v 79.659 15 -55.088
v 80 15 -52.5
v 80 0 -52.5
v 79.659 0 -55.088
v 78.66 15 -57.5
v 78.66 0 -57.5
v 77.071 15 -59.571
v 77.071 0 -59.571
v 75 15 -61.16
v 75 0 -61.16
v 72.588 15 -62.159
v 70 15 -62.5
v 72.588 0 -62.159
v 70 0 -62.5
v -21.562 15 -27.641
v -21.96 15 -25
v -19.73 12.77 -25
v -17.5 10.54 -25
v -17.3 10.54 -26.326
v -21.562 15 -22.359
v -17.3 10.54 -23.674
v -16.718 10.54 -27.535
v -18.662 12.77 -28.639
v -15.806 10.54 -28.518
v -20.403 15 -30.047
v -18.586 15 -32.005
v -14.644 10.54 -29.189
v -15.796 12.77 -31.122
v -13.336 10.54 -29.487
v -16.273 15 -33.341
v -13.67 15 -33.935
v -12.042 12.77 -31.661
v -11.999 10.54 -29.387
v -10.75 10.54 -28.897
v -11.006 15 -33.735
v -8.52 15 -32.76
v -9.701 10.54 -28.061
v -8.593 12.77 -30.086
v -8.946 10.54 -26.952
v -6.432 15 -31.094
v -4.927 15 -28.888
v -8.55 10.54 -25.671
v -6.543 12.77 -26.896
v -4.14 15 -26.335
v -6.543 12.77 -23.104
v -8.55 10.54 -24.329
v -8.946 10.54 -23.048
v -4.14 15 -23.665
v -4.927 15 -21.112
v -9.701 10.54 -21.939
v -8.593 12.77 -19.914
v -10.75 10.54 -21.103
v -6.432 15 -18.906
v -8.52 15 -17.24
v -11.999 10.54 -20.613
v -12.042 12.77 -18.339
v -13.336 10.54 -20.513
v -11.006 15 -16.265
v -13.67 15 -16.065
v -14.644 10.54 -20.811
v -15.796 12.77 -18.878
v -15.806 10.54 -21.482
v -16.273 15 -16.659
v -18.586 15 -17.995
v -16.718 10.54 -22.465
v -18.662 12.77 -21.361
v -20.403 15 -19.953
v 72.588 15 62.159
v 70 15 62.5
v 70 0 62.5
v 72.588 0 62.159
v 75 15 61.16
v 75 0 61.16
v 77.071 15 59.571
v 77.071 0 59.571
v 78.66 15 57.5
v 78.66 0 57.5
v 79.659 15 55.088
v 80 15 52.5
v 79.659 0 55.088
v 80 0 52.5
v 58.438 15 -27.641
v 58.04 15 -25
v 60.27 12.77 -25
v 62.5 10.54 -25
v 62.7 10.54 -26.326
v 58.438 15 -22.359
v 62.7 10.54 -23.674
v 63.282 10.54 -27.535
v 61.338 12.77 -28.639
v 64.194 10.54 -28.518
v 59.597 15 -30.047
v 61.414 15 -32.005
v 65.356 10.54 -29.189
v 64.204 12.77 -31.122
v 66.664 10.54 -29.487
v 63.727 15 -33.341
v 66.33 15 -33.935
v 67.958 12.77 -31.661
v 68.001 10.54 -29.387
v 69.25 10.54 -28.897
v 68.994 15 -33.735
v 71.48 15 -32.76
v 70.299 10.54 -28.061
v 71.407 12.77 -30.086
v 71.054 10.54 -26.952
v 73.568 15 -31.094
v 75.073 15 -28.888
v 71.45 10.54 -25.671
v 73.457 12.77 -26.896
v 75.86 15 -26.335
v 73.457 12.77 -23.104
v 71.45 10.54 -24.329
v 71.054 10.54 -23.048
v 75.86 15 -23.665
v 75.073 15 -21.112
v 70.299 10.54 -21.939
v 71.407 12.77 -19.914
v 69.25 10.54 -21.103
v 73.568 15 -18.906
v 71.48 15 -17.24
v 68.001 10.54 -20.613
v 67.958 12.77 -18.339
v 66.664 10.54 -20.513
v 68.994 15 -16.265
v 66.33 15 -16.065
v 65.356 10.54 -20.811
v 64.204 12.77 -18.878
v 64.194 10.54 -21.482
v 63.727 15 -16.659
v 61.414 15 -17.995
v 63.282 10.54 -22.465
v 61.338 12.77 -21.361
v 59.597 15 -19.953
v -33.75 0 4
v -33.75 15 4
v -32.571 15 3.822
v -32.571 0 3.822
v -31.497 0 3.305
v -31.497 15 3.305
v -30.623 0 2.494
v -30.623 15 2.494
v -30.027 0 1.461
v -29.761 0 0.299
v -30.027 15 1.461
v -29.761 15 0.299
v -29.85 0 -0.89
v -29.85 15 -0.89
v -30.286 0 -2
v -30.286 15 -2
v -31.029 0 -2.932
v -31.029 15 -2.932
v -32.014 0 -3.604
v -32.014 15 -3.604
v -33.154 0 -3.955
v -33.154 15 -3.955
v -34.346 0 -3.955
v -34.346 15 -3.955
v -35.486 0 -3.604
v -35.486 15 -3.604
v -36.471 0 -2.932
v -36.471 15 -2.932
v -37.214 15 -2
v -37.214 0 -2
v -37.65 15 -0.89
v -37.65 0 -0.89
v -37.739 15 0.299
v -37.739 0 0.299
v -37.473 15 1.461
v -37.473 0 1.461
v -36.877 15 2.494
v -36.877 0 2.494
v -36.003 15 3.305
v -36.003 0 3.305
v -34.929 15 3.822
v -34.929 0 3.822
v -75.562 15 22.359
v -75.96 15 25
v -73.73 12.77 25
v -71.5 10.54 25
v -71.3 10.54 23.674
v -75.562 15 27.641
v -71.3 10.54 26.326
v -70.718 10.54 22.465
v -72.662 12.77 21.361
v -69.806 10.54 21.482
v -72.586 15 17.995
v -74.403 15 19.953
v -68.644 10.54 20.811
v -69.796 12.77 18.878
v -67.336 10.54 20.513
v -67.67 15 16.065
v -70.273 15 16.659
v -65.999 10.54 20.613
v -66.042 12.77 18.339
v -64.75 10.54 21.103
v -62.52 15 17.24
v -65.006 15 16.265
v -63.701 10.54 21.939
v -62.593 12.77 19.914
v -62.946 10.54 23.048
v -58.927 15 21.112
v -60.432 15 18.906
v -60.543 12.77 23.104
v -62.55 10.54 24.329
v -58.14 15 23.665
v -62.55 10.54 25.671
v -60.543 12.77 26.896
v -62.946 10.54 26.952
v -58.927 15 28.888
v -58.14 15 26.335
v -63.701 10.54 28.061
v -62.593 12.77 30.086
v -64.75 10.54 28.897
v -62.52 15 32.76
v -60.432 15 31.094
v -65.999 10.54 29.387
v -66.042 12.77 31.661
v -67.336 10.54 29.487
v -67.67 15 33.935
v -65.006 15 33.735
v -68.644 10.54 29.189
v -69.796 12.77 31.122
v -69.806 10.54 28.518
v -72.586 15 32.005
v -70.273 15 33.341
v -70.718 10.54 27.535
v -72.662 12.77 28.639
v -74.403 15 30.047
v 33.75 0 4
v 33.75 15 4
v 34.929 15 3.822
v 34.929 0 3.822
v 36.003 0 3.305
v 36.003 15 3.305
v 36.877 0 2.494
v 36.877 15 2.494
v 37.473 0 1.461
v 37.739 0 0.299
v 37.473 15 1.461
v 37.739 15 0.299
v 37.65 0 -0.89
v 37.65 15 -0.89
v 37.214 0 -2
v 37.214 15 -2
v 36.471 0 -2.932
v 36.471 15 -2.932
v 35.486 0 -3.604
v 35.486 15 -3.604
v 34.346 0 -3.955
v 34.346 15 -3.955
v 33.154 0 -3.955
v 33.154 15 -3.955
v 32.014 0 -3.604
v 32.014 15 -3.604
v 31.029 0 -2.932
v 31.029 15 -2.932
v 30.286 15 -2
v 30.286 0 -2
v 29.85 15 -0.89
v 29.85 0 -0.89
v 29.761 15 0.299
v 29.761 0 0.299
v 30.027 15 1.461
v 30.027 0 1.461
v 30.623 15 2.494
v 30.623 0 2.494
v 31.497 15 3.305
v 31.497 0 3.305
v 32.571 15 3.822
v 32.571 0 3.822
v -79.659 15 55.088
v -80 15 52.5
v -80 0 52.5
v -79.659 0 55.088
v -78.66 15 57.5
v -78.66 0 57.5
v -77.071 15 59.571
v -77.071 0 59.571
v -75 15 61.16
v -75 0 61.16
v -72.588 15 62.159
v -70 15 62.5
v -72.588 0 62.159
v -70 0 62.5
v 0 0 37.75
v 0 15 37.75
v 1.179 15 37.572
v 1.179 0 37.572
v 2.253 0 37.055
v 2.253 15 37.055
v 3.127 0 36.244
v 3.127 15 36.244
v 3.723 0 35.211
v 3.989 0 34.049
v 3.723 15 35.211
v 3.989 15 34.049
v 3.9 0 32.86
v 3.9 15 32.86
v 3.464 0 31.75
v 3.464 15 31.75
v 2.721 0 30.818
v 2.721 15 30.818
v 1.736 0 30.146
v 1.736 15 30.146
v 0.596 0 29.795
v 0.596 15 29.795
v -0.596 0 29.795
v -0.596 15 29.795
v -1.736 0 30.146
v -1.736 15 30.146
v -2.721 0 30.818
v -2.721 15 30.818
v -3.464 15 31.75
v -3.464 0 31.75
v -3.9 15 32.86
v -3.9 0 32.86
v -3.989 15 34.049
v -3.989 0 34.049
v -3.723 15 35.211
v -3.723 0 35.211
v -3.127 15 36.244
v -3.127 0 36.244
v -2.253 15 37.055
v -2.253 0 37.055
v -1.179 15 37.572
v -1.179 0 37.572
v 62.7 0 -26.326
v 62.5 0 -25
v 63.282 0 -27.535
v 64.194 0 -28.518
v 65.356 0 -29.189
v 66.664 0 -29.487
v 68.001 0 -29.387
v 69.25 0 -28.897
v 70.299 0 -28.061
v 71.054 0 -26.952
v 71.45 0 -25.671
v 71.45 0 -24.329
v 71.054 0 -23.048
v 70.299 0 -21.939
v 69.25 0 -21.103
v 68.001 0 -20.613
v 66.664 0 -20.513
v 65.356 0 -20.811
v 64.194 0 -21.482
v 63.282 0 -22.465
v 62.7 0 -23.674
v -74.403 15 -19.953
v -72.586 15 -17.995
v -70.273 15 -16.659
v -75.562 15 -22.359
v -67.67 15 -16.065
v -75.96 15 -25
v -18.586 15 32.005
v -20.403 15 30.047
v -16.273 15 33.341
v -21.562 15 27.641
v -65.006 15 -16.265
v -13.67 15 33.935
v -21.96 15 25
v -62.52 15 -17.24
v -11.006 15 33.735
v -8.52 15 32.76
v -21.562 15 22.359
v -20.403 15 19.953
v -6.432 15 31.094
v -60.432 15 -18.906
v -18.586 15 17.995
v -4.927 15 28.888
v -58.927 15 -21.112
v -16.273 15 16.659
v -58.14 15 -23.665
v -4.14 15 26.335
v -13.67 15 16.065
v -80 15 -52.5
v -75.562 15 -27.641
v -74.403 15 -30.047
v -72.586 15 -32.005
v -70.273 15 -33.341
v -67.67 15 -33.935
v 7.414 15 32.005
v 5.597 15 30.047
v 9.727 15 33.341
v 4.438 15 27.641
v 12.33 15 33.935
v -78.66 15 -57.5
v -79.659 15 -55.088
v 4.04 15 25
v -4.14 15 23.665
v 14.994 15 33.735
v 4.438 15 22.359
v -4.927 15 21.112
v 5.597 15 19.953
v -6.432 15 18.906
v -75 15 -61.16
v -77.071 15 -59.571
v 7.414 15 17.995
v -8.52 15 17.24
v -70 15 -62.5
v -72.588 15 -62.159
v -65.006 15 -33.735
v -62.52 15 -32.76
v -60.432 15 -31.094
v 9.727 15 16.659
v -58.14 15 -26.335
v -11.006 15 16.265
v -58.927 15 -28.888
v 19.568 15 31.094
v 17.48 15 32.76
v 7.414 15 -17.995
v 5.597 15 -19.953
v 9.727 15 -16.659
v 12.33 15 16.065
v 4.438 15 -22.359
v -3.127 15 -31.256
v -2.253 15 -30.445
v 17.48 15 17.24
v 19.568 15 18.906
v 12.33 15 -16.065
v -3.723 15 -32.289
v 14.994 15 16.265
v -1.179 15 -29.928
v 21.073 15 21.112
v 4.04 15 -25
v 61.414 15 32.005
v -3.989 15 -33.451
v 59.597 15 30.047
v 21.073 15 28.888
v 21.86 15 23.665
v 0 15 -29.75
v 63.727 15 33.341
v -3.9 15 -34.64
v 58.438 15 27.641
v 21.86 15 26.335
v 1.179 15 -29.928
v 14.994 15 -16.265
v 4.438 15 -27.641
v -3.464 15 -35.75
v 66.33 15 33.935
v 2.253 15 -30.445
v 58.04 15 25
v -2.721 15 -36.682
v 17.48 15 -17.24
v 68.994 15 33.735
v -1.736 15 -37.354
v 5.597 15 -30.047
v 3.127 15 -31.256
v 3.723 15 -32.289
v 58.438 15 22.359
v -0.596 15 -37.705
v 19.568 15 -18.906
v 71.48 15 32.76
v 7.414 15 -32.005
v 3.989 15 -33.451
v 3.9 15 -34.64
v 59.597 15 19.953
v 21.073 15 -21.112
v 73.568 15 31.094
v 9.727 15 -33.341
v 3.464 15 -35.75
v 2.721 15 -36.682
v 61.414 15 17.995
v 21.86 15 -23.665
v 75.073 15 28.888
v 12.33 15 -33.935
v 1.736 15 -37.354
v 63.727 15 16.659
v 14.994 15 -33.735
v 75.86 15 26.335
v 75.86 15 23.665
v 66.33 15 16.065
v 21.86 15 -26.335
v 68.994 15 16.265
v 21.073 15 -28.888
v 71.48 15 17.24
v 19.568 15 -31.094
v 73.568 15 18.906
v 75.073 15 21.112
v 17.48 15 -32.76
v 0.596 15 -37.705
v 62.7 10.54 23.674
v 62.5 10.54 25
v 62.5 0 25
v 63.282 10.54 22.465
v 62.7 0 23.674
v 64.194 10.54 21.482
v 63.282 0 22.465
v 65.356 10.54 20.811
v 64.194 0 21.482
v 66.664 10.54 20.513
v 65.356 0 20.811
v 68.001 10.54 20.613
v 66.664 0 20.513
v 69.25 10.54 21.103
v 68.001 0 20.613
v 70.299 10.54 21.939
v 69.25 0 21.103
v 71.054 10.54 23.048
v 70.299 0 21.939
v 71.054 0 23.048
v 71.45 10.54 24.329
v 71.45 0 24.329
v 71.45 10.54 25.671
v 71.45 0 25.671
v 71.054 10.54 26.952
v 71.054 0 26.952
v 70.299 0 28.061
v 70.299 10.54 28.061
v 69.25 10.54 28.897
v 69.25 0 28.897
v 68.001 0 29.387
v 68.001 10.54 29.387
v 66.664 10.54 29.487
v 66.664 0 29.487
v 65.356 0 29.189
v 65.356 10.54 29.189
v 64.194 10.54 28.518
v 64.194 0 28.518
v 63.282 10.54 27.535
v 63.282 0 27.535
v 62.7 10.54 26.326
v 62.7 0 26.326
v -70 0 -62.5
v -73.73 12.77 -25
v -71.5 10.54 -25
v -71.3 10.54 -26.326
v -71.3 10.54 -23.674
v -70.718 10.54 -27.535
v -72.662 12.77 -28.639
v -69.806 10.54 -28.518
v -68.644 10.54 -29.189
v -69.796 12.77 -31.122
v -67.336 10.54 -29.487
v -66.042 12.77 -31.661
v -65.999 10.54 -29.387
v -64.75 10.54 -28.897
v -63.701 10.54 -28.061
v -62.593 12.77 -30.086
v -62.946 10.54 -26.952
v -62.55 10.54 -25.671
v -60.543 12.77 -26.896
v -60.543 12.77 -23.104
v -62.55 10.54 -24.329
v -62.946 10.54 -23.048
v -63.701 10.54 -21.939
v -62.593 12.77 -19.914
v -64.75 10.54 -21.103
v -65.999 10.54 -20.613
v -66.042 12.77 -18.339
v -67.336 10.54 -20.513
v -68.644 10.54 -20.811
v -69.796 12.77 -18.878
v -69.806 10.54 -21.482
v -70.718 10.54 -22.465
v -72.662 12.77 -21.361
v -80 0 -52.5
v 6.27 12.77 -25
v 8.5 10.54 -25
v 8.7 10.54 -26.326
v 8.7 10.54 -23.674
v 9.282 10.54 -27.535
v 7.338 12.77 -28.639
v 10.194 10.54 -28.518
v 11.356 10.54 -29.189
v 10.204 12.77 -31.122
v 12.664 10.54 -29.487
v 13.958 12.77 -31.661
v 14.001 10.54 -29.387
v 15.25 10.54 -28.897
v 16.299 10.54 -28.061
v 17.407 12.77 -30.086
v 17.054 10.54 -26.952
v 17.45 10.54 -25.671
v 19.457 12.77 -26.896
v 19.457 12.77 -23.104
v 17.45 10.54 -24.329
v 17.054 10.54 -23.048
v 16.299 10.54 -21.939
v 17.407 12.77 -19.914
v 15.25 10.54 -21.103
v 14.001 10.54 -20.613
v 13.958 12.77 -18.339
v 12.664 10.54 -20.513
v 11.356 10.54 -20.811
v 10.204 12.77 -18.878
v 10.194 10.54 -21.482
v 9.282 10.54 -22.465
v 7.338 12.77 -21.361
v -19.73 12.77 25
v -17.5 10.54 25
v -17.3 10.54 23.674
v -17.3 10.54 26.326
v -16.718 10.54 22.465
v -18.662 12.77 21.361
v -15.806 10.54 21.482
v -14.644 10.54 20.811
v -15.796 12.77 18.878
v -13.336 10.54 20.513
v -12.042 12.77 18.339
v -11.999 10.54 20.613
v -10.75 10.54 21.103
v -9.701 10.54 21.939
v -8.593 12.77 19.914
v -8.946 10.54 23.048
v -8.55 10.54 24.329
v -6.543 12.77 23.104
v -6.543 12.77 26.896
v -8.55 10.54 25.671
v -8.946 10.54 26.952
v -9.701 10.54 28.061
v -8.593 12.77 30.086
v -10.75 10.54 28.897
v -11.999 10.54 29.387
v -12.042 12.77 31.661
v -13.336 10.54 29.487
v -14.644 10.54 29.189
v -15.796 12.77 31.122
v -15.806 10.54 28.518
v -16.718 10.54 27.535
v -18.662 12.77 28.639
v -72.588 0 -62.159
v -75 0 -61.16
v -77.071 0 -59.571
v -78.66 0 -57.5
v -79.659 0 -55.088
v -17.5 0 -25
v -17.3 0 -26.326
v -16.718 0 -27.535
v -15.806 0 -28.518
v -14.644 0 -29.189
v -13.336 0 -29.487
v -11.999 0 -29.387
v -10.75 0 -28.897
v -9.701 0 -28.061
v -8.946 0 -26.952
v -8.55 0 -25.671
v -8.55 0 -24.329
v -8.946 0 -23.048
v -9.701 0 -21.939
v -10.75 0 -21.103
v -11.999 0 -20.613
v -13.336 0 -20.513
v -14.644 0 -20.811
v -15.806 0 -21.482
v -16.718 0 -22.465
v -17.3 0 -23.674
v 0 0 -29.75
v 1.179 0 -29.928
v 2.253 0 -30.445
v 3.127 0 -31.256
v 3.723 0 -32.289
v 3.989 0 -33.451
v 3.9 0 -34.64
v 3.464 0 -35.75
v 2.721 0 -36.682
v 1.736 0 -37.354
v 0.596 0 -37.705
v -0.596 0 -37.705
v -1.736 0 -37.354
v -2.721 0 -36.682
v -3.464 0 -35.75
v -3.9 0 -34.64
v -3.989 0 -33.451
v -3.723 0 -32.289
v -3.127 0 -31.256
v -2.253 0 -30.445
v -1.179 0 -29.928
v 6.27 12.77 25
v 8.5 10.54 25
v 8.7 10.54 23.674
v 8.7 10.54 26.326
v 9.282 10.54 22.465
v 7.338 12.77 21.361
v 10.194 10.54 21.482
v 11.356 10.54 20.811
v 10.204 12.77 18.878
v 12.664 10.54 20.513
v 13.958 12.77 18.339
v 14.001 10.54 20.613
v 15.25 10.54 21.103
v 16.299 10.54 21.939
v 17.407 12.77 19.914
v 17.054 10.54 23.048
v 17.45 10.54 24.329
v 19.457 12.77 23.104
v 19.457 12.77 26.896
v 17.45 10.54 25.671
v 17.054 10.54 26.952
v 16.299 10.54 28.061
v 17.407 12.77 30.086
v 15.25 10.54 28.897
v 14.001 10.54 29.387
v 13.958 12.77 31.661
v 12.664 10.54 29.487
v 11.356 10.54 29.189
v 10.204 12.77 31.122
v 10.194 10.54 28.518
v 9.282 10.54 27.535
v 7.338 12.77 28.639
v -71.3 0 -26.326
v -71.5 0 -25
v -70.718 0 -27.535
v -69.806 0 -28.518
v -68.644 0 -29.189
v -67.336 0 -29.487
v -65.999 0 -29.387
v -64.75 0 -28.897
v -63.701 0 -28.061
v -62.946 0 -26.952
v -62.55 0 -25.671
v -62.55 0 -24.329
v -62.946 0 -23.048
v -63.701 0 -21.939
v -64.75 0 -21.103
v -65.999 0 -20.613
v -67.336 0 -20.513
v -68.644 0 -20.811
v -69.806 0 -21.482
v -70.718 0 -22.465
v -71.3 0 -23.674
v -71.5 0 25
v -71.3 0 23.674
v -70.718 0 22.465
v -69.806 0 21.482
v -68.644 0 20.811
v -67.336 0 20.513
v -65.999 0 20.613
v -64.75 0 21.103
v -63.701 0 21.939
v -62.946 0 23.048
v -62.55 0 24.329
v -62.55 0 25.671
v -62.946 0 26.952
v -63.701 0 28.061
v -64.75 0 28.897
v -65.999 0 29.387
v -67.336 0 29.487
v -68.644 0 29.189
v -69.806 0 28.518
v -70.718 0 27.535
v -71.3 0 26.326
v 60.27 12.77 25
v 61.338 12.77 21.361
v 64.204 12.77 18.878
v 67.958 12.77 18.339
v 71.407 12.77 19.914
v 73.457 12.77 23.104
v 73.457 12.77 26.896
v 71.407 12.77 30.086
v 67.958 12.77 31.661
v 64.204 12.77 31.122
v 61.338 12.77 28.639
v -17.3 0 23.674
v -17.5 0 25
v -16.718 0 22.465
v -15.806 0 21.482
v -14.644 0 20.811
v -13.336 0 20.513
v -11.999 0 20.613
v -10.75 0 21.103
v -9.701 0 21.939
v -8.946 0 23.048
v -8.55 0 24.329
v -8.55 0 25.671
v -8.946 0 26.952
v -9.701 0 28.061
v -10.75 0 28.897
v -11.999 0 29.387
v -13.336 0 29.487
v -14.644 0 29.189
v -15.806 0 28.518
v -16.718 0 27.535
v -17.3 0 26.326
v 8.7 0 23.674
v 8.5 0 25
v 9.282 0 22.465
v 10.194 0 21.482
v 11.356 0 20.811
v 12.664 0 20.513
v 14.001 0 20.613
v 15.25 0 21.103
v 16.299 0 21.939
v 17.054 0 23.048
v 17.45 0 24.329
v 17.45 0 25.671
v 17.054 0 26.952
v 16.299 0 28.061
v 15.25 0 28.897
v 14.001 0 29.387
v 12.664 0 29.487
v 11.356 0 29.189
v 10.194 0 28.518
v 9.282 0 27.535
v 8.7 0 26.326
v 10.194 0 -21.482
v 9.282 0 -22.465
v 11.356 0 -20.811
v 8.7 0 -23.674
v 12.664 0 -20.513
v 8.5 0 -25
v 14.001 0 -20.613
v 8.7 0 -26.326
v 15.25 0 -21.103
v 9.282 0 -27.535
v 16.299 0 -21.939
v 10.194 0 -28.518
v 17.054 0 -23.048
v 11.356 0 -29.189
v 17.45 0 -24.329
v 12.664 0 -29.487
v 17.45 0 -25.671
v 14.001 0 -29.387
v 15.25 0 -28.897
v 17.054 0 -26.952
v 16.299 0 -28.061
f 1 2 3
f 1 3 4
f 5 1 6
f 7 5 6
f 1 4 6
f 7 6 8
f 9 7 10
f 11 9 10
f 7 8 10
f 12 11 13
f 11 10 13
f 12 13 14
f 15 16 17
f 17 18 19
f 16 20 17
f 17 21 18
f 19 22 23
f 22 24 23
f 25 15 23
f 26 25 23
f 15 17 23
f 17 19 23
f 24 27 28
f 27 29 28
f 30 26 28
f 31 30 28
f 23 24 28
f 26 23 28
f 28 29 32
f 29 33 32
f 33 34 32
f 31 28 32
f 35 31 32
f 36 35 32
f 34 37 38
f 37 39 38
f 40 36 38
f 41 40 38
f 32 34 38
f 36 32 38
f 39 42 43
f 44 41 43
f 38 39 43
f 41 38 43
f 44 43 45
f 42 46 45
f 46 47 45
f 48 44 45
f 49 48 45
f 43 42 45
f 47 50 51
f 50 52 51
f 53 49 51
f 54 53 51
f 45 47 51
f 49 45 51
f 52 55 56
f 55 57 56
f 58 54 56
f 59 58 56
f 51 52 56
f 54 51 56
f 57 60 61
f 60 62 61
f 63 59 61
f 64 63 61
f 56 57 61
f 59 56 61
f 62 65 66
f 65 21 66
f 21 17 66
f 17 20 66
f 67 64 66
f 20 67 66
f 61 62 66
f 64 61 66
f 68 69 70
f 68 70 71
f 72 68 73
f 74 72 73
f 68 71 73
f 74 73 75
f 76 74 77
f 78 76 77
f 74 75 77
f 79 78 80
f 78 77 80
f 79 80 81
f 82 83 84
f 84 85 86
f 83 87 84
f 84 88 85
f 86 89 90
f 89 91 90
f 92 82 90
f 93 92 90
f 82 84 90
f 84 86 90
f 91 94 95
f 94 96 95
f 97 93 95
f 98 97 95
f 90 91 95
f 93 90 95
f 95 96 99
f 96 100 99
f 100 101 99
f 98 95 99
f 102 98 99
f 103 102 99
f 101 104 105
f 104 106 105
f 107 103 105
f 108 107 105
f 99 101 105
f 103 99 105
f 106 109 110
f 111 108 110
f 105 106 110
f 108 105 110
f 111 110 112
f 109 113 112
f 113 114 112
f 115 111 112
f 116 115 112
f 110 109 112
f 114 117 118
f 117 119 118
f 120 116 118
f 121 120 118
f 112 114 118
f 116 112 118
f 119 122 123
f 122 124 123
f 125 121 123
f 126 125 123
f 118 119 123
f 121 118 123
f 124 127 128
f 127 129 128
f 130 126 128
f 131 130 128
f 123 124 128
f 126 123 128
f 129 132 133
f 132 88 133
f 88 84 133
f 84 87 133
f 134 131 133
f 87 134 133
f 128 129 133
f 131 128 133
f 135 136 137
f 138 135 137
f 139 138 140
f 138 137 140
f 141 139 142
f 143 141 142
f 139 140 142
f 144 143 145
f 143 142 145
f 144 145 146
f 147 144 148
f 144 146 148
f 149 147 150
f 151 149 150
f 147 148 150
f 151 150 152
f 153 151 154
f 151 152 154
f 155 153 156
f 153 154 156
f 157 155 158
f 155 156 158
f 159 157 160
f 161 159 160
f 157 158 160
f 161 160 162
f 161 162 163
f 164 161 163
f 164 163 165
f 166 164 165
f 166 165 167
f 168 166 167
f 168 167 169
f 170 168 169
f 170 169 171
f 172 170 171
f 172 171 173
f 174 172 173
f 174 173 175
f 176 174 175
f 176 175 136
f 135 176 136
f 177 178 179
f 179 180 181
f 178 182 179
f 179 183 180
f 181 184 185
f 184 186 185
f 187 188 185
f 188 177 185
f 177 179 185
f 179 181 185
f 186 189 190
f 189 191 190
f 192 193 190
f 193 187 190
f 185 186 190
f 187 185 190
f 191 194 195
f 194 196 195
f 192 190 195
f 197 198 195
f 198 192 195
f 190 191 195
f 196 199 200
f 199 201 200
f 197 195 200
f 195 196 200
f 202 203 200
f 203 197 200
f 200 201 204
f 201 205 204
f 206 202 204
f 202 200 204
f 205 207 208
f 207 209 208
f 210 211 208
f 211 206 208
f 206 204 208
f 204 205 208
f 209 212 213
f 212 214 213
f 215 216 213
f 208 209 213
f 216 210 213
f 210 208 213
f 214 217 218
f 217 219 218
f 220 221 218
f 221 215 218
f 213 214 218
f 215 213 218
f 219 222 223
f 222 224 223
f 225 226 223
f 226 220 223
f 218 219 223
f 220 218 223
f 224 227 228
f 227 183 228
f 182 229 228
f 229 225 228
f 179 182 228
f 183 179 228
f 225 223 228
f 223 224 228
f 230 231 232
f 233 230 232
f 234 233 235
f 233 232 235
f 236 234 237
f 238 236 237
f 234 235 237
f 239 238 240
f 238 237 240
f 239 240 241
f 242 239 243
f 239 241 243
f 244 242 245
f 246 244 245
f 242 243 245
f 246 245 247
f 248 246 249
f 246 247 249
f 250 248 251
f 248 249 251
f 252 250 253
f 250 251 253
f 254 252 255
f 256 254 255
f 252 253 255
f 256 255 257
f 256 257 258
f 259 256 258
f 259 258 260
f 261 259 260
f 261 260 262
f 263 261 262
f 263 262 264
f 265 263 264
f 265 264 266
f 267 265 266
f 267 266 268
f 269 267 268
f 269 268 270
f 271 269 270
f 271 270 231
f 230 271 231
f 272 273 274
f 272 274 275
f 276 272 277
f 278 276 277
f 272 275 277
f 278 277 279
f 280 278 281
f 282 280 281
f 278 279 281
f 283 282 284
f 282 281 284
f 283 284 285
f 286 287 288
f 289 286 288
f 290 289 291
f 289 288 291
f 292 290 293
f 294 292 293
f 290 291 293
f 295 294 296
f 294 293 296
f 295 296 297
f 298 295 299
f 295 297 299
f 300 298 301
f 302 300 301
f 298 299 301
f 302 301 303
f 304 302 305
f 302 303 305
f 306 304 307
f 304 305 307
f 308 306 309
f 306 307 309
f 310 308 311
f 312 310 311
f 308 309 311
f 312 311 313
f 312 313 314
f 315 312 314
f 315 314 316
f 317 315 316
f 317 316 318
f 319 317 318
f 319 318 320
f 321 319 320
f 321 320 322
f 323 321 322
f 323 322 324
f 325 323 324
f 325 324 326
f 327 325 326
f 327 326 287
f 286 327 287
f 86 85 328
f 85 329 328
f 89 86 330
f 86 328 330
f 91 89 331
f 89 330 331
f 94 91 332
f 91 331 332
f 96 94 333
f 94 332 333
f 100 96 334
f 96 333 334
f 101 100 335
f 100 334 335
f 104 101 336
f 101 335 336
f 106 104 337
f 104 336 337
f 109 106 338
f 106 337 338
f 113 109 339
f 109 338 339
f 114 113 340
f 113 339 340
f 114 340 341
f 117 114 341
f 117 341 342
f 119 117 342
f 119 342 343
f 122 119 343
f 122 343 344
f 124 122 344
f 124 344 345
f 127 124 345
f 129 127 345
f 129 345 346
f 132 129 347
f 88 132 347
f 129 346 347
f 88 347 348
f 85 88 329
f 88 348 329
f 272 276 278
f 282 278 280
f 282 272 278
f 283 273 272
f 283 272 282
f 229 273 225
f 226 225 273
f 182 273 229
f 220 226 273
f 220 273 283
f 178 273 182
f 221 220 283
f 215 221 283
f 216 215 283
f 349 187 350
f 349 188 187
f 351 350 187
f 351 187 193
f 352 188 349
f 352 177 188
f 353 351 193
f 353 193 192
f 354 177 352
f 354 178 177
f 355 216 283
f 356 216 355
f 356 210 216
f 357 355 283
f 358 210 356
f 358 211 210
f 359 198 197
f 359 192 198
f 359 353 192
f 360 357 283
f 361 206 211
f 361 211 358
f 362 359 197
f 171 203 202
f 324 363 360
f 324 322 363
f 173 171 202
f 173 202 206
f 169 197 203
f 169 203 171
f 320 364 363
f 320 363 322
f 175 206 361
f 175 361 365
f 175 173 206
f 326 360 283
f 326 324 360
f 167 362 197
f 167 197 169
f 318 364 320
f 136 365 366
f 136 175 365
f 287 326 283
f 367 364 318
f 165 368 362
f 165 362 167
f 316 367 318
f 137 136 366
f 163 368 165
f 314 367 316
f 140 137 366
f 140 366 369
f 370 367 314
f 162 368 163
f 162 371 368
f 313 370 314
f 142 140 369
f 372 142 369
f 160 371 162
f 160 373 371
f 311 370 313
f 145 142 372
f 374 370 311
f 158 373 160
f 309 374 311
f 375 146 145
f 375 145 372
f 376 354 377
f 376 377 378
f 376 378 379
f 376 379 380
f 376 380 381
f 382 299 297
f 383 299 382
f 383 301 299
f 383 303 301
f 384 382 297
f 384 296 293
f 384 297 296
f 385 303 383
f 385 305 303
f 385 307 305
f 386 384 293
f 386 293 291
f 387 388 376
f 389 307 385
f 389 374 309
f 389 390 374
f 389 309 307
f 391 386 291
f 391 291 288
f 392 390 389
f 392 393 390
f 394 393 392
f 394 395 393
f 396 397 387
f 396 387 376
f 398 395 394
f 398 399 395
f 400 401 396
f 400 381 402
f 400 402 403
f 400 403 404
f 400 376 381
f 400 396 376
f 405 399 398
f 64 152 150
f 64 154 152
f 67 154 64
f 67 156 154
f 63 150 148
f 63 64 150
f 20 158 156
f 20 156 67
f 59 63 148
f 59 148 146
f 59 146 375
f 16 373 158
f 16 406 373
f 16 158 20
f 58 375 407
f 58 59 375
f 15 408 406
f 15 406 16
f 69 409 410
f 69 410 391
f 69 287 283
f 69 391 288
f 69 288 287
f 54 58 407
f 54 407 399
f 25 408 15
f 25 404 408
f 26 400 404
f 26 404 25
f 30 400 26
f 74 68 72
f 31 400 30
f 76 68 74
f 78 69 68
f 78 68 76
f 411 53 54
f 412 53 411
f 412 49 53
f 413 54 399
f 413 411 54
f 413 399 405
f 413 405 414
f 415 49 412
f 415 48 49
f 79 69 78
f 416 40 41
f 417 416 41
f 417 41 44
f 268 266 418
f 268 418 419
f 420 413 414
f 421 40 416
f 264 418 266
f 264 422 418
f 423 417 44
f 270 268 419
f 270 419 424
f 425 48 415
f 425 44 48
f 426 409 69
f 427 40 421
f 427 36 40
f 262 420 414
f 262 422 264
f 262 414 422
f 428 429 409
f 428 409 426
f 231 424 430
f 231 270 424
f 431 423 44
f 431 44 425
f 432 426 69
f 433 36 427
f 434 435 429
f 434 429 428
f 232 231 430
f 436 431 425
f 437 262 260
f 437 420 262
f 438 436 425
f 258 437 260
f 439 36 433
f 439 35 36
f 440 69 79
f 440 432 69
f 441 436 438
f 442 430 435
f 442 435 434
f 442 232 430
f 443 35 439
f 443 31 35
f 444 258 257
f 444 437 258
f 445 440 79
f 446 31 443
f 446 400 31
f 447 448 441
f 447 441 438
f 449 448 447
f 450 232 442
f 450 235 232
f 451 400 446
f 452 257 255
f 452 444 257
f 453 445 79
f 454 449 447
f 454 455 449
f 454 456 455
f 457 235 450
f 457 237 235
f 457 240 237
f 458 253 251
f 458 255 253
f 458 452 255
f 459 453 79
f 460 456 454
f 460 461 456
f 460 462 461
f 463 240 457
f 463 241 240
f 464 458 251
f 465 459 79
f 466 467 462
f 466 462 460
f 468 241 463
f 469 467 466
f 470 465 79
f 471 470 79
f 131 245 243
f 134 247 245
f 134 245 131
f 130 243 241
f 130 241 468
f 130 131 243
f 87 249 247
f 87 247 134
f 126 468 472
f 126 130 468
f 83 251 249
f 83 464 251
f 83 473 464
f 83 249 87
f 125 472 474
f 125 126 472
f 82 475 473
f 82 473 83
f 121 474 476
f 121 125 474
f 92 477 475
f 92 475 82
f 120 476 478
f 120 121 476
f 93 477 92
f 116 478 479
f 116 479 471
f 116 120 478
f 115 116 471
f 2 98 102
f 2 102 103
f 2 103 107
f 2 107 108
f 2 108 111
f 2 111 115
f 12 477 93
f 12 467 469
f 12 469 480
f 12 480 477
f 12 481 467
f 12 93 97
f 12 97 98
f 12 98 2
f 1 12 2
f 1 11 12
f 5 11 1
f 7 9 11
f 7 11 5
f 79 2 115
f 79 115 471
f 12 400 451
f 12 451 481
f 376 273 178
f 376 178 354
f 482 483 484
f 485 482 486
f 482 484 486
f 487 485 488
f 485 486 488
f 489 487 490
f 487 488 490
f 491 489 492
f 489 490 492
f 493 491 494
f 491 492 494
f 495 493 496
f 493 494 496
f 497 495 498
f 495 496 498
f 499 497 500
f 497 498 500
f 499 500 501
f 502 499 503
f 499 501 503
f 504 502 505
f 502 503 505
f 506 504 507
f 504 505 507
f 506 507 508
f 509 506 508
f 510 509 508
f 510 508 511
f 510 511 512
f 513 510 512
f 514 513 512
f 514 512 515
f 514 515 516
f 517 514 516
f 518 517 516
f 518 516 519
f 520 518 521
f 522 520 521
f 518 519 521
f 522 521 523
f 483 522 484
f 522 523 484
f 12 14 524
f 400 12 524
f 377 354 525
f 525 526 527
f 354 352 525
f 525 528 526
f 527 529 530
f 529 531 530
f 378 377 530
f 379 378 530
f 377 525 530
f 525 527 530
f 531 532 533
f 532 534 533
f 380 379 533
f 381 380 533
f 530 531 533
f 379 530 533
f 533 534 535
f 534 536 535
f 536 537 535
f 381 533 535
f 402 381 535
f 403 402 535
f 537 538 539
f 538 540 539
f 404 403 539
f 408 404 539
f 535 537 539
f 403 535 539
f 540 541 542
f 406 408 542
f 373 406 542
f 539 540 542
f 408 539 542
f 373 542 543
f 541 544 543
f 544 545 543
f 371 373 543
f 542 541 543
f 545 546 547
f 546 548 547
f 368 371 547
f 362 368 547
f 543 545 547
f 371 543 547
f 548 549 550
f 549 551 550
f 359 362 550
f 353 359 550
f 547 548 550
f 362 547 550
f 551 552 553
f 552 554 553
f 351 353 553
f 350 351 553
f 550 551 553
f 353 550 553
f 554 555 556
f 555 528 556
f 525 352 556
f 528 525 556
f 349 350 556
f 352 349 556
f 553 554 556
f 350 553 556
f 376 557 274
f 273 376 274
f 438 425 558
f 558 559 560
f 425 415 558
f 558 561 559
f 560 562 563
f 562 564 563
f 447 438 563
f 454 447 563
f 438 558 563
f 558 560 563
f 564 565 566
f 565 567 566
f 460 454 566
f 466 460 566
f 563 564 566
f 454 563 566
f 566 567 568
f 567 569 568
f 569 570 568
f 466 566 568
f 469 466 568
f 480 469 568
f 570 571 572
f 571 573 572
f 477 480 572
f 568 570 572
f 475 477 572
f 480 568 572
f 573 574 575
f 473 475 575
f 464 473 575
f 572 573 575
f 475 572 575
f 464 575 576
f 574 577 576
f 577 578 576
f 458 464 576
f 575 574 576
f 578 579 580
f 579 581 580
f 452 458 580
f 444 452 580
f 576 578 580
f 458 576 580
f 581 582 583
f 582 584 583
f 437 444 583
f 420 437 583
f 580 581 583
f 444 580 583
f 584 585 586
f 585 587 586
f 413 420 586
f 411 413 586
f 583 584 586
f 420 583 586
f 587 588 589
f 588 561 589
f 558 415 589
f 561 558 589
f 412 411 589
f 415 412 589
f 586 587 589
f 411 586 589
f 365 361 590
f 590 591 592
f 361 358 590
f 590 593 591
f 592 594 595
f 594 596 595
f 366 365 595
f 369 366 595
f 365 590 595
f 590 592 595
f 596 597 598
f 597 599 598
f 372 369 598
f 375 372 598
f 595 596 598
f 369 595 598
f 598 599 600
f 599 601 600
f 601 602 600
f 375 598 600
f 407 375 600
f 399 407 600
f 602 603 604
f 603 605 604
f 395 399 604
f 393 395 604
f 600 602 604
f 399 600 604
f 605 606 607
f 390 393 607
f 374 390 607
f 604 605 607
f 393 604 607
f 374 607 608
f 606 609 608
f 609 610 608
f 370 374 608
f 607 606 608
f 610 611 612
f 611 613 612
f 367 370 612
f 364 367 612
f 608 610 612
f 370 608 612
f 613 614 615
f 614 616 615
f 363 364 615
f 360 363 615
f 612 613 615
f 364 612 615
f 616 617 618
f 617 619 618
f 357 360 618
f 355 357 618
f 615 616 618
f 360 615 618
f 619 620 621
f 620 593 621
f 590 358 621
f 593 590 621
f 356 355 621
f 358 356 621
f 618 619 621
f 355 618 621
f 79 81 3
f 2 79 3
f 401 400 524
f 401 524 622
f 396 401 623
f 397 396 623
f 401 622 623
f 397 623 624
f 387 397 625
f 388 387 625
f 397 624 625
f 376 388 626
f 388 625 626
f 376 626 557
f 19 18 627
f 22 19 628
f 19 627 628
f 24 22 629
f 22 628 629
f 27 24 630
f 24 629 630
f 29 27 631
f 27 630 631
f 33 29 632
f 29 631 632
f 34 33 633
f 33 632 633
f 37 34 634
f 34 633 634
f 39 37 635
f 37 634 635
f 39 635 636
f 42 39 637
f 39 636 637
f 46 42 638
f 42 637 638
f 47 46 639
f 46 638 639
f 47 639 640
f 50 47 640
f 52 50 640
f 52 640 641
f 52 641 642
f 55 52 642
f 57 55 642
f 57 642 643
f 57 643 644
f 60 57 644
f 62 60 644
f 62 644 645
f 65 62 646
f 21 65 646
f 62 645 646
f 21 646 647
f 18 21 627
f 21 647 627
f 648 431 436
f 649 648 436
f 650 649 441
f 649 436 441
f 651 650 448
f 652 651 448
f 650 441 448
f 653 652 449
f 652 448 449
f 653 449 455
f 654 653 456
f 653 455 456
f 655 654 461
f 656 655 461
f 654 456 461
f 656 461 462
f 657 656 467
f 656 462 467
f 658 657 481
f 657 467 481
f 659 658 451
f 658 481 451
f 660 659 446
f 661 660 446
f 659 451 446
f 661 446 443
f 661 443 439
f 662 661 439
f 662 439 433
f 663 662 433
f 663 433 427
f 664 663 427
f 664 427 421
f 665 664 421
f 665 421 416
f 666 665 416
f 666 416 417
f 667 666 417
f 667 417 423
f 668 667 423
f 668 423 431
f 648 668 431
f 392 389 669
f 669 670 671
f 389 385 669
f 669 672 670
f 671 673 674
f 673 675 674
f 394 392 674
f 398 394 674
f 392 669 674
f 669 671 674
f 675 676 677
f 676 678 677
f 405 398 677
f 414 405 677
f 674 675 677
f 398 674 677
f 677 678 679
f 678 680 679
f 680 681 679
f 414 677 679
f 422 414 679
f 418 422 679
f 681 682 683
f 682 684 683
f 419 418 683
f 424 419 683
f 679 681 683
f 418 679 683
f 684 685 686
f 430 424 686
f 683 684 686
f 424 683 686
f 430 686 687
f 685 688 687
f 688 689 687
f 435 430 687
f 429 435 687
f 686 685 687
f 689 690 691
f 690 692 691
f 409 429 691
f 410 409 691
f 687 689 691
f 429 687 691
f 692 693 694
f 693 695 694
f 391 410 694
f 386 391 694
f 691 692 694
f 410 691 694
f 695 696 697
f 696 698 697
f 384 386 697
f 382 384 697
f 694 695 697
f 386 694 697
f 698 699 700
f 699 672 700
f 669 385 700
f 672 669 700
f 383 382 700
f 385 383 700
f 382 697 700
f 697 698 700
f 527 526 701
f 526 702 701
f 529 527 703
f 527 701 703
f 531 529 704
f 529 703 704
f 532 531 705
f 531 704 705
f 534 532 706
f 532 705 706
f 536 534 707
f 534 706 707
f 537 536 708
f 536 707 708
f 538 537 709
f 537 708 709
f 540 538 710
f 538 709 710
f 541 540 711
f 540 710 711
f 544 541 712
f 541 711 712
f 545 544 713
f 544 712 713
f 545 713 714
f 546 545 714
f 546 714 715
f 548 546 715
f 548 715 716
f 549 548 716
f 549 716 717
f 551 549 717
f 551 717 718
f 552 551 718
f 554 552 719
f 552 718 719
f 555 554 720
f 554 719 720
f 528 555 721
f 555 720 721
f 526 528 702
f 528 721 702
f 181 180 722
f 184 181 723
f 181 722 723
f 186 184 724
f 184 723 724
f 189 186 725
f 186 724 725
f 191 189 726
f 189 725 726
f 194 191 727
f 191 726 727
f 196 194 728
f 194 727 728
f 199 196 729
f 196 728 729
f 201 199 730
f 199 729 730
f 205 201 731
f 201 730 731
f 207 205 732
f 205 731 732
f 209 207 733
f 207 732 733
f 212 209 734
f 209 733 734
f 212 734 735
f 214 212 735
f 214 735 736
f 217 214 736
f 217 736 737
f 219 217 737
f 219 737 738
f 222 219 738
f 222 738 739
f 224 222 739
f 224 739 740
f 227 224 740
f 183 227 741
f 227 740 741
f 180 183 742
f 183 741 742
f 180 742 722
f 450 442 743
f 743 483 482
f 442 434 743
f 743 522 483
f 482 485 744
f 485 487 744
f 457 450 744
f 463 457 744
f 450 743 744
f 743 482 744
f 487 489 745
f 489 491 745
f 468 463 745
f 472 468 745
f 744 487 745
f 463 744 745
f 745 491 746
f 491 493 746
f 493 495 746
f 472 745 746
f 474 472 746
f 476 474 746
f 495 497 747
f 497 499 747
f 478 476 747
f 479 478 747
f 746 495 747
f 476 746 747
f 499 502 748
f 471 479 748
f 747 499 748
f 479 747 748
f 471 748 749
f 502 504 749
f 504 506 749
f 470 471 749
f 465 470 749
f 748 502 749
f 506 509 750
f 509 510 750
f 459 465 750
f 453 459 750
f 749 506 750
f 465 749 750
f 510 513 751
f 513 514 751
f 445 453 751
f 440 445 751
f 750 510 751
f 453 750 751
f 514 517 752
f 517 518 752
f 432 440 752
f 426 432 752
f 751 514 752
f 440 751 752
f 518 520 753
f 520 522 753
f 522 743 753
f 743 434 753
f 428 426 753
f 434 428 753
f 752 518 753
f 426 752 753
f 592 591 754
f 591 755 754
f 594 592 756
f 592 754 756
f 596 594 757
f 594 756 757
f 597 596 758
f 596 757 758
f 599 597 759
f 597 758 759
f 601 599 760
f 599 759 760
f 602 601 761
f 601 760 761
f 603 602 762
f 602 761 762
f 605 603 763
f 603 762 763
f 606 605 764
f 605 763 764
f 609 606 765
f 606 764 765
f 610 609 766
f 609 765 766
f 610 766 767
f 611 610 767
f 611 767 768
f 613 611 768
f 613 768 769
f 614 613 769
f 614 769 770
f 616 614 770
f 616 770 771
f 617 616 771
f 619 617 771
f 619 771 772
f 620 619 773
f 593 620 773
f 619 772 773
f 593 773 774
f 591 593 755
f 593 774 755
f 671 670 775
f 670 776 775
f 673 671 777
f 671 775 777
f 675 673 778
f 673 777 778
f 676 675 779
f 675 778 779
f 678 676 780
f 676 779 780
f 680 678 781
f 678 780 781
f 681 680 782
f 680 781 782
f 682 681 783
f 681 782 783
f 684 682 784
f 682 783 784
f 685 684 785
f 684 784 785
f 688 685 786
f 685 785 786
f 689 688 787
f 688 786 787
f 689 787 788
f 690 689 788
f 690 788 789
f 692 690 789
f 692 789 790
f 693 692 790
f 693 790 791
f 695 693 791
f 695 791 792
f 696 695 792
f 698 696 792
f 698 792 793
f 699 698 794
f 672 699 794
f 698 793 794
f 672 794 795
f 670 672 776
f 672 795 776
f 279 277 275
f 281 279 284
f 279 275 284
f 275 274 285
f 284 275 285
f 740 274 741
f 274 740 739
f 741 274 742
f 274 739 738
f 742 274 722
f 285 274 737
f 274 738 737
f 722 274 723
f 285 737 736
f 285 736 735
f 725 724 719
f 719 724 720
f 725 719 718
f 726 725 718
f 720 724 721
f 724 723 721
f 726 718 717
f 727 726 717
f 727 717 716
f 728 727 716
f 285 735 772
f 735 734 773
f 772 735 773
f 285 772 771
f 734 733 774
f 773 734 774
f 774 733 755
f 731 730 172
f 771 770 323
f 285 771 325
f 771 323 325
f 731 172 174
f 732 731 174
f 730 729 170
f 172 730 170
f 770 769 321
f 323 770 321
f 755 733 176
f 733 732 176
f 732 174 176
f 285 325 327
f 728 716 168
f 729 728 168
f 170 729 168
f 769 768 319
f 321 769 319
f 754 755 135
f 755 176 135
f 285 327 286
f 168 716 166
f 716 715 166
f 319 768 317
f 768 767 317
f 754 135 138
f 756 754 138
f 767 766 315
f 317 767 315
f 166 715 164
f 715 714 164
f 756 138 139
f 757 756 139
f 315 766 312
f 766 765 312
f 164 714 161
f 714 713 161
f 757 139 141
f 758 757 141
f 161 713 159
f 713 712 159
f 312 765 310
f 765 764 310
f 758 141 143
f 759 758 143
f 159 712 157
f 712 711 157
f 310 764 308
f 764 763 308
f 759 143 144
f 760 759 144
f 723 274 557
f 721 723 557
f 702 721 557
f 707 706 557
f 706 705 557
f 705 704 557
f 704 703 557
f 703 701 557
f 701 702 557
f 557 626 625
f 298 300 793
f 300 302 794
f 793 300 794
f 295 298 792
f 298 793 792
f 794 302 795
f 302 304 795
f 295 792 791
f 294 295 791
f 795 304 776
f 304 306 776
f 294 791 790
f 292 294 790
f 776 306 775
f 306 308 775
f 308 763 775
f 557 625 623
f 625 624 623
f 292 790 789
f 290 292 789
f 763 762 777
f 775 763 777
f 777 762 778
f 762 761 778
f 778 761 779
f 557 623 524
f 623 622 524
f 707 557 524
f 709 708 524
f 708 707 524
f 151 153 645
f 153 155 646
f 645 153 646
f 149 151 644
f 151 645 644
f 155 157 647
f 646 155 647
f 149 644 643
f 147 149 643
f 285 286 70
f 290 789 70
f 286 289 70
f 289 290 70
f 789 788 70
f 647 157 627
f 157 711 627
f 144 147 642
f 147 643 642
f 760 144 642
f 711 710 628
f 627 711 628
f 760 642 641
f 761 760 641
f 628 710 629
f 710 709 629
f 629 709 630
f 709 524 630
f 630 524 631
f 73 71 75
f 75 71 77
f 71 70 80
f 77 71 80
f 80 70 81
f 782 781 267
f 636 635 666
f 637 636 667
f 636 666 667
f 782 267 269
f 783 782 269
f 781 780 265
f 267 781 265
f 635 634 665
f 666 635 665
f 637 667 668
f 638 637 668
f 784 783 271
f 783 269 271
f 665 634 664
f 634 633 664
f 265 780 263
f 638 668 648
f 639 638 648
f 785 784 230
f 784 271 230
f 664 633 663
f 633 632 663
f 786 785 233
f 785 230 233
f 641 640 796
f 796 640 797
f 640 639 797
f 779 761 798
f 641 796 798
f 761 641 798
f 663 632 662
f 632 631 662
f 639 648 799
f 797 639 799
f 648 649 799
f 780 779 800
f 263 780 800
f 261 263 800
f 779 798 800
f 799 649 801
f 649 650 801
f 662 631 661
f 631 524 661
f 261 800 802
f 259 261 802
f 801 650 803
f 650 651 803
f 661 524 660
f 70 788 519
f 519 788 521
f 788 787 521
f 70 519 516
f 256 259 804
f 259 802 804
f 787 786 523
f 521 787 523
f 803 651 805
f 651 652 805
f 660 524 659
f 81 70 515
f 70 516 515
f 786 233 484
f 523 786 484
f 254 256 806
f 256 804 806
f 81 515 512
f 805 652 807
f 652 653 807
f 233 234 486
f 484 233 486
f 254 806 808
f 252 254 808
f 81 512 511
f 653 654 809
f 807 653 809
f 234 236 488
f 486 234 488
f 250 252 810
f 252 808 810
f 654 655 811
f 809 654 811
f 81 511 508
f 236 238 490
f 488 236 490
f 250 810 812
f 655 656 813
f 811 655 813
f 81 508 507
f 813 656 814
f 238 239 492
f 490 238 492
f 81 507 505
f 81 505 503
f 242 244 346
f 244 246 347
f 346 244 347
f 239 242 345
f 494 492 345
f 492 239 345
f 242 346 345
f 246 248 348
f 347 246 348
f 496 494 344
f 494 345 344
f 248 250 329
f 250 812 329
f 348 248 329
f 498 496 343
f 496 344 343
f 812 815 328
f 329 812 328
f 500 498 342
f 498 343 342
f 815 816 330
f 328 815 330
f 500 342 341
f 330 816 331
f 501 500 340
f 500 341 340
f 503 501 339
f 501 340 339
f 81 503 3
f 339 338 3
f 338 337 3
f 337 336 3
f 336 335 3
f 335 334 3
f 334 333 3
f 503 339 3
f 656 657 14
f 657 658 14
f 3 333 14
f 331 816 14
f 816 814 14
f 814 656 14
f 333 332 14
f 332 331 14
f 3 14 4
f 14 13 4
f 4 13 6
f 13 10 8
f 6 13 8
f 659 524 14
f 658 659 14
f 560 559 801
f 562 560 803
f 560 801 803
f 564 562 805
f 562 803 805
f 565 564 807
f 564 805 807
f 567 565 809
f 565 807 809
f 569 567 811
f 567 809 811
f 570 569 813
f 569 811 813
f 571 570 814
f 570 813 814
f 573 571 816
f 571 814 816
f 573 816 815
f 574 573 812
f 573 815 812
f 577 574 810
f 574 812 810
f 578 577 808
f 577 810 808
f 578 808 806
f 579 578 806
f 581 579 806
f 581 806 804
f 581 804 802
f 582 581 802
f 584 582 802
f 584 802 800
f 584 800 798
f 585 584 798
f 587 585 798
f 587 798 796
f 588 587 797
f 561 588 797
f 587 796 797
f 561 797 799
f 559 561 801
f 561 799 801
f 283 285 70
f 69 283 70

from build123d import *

# Parameters (mm, degrees)
DODANIE_WYCI_GNI_CIE1_DEPTH                        = 15
SZKIC2_R                                           = 4
WYTNIJ_WYCI_GNI_CIE1_DEPTH                         = 103.621878759
LUSTRO2_COPY_1_SKETCH_R                            = 4
LUSTRO2_COPY_1_DEPTH                               = 103.621878759
SFAZOWANIE1_SIZE                                   = 0.5
POG_BIENIE_STO_KOWE_POD_M8_WKR_T_Z_BEM_D           = 9
POG_BIENIE_STO_KOWE_POD_M8_WKR_T_Z_BEM_CSINK_D     = 17.92
POG_BIENIE_STO_KOWE_POD_M8_WKR_T_Z_BEM_CSINK_ANGLE = 90
SZKIC5_R                                           = 4
WYTNIJ_WYCI_GNI_CIE2_DEPTH                         = 103.621878759


with BuildPart() as part:
    # Szkic1 → Dodanie-wyciągnięcie1 (new body)
    with BuildSketch(Plane(origin=(0, 0, 0), x_dir=(1, 0, 0), z_dir=(0, 1, 0))):
        with BuildLine():
            Line((-70, -62.5), (70, -62.5))
            ThreePointArc((70, -62.5), (77.071067812, -59.571067812), (80, -52.5))
            Line((80, -52.5), (80, 52.5))
            ThreePointArc((80, 52.5), (77.071067812, 59.571067812), (70, 62.5))
            Line((70, 62.5), (-70, 62.5))
            ThreePointArc((-70, 62.5), (-77.071067812, 59.571067812), (-80, 52.5))
            Line((-80, 52.5), (-80, -52.5))
            ThreePointArc((-80, -52.5), (-77.071067812, -59.571067812), (-70, -62.5))
        make_face()
    extrude(amount=DODANIE_WYCI_GNI_CIE1_DEPTH)

    # Szkic2 → Wytnij-wyciągnięcie1 (cut, symmetric)
    with BuildSketch(Plane(origin=(0, 15, 0), x_dir=(1, 0, 0), z_dir=(0, 1, 0))):
        with Locations(Location((-67, -25, 0), (0, 0, 270))):
            Circle(SZKIC2_R)
        with Locations(Location((-13, -25, 0), (0, 0, 90))):
            Circle(SZKIC2_R)
    wytnij_wyci_gni_cie1 = extrude(amount=WYTNIJ_WYCI_GNI_CIE1_DEPTH, both=True, mode=Mode.SUBTRACT)

    # Lustro1: Wytnij-wyciągnięcie1 across plane
    add(wytnij_wyci_gni_cie1.mirror(Plane.XY), mode=Mode.SUBTRACT)

    # Lustro2: Wytnij-wyciągnięcie1 across plane
    add(wytnij_wyci_gni_cie1.mirror(Plane(origin=(0, 0, 0), x_dir=(0, 0, 1), z_dir=(1, 0, 0))), mode=Mode.SUBTRACT)

    # Lustro2 copy 1 sketch → Lustro2 copy 1 (cut, symmetric)
    with BuildSketch(Plane(origin=(0, 15, 0), x_dir=(-1, 0, 0), z_dir=(0, 1, 0))):
        with Locations(Location((-67, -25, 0), (0, 0, 270))):
            Circle(LUSTRO2_COPY_1_SKETCH_R)
        with Locations(Location((-13, -25, 0), (0, 0, 90))):
            Circle(LUSTRO2_COPY_1_SKETCH_R)
    extrude(amount=LUSTRO2_COPY_1_DEPTH, both=True, mode=Mode.SUBTRACT)

    # Sfazowanie1
    sfazowanie1_edges = [part.edges().sort_by_distance(p)[0] for p in [
        (-67, 0, 21),
        (-67, 15, 21),
        (-13, 0, 29),
        (-13, 15, 29),
        (-67, 15, -21),
        (-67, 0, -21),
        (-13, 15, -29),
        (-13, 0, -29),
        (67, 0, -21),
        (67, 15, -21),
        (13, 0, -29),
        (13, 15, -29),
        (67, 15, 21),
        (67, 0, 21),
        (13, 15, 29),
        (13, 0, 29),
    ]]
    chamfer(sfazowanie1_edges, length=SFAZOWANIE1_SIZE)

    # Pogłębienie stożkowe pod M8 Wkręt z łbem stożkowym płaskim1 (through all)
    with Locations(Plane(origin=(0, 15, 0), x_dir=(1, 0, 0), z_dir=(0, 1, 0))):
        with Locations((-67, 25), (-13, 25), (-13, -25), (13, -25), (13, 25), (67, 25), (67, -25), (-67, -25)):
            CounterSinkHole(POG_BIENIE_STO_KOWE_POD_M8_WKR_T_Z_BEM_D / 2, POG_BIENIE_STO_KOWE_POD_M8_WKR_T_Z_BEM_CSINK_D / 2, counter_sink_angle=POG_BIENIE_STO_KOWE_POD_M8_WKR_T_Z_BEM_CSINK_ANGLE)

    # Szkic5 → Wytnij-wyciągnięcie2 (cut, through all)
    with BuildSketch(Plane(origin=(0, 15, 0), x_dir=(1, 0, 0), z_dir=(0, 1, 0))):
        with Locations(Location((0, 33.75, 0), (0, 0, 270))):
            Circle(SZKIC5_R)
        with Locations(Location((33.75, 0, 0), (0, 0, 270))):
            Circle(SZKIC5_R)
        with Locations(Location((0, -33.75, 0), (0, 0, 270))):
            Circle(SZKIC5_R)
        with Locations(Location((-33.75, 0, 0), (0, 0, 270))):
            Circle(SZKIC5_R)
    extrude(amount=-WYTNIJ_WYCI_GNI_CIE2_DEPTH, mode=Mode.SUBTRACT)


solid = part.part
